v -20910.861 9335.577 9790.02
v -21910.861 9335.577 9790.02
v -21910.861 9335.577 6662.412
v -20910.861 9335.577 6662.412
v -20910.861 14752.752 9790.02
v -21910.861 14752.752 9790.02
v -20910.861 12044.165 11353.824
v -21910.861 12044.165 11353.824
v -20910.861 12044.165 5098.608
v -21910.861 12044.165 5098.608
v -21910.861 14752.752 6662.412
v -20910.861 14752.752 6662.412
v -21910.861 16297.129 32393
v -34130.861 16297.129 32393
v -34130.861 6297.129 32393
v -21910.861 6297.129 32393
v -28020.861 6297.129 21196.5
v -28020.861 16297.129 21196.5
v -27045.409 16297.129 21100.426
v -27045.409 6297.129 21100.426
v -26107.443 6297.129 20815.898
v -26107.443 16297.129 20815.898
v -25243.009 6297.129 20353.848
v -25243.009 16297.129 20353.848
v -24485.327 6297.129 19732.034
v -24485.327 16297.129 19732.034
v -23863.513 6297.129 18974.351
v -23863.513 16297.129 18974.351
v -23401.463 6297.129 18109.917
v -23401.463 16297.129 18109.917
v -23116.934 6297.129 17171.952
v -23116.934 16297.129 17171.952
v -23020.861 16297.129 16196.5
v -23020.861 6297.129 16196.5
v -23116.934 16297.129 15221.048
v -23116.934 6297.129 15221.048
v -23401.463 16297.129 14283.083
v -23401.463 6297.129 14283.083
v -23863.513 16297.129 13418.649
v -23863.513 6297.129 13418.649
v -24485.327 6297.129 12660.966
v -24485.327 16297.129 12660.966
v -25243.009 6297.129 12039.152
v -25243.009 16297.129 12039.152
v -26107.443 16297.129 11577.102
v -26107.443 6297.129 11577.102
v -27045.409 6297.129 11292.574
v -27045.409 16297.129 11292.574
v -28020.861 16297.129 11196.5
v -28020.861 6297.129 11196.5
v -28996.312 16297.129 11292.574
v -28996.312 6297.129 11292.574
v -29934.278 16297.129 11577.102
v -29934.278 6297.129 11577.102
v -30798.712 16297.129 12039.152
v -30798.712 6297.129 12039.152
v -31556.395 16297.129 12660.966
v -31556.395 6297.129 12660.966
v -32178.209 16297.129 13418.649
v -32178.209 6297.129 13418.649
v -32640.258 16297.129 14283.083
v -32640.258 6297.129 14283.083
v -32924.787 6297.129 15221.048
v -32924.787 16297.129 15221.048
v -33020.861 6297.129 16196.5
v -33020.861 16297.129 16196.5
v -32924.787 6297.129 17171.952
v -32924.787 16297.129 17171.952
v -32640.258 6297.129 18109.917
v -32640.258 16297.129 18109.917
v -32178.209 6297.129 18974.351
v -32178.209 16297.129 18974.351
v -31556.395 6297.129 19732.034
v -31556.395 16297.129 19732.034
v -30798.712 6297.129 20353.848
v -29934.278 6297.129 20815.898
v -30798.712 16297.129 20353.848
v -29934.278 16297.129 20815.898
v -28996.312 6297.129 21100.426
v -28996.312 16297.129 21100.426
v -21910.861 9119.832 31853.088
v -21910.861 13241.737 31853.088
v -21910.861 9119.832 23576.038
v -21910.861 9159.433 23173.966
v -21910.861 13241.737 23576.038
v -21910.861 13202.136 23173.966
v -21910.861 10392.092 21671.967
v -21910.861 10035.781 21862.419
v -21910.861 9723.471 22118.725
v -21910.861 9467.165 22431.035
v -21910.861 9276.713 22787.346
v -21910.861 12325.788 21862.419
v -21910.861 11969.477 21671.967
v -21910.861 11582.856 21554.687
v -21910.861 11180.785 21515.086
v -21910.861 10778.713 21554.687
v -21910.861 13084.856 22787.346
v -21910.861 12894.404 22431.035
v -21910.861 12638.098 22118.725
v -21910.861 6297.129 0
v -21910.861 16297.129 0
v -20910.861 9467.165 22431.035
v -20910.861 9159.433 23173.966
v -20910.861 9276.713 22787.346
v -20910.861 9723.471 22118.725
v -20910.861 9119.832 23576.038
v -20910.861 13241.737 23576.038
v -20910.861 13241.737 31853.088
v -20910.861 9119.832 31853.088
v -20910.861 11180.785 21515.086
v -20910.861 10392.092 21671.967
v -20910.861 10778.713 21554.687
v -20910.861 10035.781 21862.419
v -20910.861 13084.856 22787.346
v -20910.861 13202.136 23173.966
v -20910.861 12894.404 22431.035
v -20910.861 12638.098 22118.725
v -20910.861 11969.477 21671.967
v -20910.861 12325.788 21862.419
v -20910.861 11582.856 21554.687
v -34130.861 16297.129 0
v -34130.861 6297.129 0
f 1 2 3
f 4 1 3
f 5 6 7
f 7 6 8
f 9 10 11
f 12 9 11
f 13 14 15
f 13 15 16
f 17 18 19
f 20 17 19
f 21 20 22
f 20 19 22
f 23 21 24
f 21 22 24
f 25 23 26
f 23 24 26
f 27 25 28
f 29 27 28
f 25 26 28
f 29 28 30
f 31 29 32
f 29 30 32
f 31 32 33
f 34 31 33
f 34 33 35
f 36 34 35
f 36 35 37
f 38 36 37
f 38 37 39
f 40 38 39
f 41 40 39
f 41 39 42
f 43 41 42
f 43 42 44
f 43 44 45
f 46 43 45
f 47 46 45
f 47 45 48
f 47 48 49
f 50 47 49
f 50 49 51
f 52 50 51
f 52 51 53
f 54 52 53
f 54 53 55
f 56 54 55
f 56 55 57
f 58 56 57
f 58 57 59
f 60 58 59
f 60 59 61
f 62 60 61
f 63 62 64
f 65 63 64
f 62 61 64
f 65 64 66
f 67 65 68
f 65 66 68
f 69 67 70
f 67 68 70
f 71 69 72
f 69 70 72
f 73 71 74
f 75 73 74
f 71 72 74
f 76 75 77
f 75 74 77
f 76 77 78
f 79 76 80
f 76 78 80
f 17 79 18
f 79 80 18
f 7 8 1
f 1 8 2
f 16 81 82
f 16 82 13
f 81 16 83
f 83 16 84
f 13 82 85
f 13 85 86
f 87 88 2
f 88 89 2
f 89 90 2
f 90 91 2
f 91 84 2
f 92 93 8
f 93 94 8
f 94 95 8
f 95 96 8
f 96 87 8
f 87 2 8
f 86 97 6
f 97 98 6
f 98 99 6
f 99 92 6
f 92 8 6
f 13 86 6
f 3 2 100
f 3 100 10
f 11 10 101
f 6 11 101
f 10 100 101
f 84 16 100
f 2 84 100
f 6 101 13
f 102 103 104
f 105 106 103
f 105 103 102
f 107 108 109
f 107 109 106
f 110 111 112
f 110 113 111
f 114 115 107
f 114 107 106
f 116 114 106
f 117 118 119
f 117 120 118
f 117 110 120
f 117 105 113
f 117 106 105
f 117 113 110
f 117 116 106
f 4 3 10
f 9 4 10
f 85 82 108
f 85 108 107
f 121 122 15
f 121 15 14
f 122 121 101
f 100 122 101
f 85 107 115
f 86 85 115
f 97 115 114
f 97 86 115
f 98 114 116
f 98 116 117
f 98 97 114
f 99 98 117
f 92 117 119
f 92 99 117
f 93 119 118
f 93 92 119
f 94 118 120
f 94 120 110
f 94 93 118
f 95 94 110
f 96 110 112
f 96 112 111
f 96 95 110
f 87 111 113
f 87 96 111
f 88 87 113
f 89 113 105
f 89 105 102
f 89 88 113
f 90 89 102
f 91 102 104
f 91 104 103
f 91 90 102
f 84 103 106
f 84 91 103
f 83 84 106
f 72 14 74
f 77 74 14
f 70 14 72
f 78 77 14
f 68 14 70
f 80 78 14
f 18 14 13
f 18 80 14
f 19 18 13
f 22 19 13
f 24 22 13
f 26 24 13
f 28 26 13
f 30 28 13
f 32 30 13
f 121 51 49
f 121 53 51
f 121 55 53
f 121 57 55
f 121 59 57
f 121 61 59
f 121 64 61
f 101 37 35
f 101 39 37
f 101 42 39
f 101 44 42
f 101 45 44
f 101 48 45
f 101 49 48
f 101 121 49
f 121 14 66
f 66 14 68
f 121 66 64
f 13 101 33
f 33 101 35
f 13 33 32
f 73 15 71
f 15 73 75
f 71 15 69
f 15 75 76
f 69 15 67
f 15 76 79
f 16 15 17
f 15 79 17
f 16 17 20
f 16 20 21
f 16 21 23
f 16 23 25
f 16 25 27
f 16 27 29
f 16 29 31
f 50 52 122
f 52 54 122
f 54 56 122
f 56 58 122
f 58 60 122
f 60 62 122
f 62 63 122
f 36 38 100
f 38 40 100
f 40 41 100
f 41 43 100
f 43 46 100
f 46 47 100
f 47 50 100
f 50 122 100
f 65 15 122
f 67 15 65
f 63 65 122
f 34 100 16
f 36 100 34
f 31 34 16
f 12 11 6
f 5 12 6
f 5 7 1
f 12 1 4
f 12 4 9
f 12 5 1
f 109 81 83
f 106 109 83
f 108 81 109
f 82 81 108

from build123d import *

# Parameters (mm, degrees)
SKETCH1_W           = 12220
SKETCH1_H           = 10000
BOSS_EXTRUDE2_DEPTH = 32393
SKETCH2_R           = 5000
CUT_EXTRUDE1_DEPTH  = 48107.362321948
SKETCH6_W           = 8277.049727591
SKETCH6_H           = 4121.904282014
BOSS_EXTRUDE3_DEPTH = 1000
BOSS_EXTRUDE4_DEPTH = 1000


with BuildPart() as part:
    # Sketch1 → Boss-Extrude2 (new body)
    with BuildSketch(Plane.XY):
        with Locations((-28020.860622764, 11297.128627885)):
            Rectangle(SKETCH1_W, SKETCH1_H)
    extrude(amount=BOSS_EXTRUDE2_DEPTH)

    # Sketch2 → Cut-Extrude1 (cut, through all)
    with BuildSketch(Plane(origin=(0, 16297.128627885, 0), x_dir=(1, 0, 0), z_dir=(0, 1, 0))):
        with Locations(Location((-28020.860622764, -16196.5, 0), (0, 0, 270))):
            Circle(SKETCH2_R)
    extrude(amount=-CUT_EXTRUDE1_DEPTH, mode=Mode.SUBTRACT)

    # Sketch6 → Boss-Extrude3 (add)
    with BuildSketch(Plane(origin=(-21910.860622764, 0, 0), x_dir=(0, 0, -1), z_dir=(1, 0, 0))):
        with Locations((-27714.563175142, 11180.784555409)):
            Rectangle(SKETCH6_W, SKETCH6_H)
        with BuildLine():
            ThreePointArc((-23576.038311346, 13241.736696416), (-21515.086170339, 11180.784555409), (-23576.038311346, 9119.832414402))
            Line((-23576.038311346, 9119.832414402), (-23576.038311346, 13241.736696416))
        make_face()
    extrude(amount=BOSS_EXTRUDE3_DEPTH)

    # Sketch7 → Boss-Extrude4 (add)
    with BuildSketch(Plane(origin=(-21910.860622764, 0, 0), x_dir=(0, 0, -1), z_dir=(1, 0, 0))):
        Polygon((-5098.608311025, 12044.164639286), (-6662.412231117, 14752.75248196), (-9790.020071301, 14752.75248196), (-11353.823991393, 12044.164639286), (-9790.020071301, 9335.576796611), (-6662.412231117, 9335.576796611), align=None)
    extrude(amount=BOSS_EXTRUDE4_DEPTH)


solid = part.part
